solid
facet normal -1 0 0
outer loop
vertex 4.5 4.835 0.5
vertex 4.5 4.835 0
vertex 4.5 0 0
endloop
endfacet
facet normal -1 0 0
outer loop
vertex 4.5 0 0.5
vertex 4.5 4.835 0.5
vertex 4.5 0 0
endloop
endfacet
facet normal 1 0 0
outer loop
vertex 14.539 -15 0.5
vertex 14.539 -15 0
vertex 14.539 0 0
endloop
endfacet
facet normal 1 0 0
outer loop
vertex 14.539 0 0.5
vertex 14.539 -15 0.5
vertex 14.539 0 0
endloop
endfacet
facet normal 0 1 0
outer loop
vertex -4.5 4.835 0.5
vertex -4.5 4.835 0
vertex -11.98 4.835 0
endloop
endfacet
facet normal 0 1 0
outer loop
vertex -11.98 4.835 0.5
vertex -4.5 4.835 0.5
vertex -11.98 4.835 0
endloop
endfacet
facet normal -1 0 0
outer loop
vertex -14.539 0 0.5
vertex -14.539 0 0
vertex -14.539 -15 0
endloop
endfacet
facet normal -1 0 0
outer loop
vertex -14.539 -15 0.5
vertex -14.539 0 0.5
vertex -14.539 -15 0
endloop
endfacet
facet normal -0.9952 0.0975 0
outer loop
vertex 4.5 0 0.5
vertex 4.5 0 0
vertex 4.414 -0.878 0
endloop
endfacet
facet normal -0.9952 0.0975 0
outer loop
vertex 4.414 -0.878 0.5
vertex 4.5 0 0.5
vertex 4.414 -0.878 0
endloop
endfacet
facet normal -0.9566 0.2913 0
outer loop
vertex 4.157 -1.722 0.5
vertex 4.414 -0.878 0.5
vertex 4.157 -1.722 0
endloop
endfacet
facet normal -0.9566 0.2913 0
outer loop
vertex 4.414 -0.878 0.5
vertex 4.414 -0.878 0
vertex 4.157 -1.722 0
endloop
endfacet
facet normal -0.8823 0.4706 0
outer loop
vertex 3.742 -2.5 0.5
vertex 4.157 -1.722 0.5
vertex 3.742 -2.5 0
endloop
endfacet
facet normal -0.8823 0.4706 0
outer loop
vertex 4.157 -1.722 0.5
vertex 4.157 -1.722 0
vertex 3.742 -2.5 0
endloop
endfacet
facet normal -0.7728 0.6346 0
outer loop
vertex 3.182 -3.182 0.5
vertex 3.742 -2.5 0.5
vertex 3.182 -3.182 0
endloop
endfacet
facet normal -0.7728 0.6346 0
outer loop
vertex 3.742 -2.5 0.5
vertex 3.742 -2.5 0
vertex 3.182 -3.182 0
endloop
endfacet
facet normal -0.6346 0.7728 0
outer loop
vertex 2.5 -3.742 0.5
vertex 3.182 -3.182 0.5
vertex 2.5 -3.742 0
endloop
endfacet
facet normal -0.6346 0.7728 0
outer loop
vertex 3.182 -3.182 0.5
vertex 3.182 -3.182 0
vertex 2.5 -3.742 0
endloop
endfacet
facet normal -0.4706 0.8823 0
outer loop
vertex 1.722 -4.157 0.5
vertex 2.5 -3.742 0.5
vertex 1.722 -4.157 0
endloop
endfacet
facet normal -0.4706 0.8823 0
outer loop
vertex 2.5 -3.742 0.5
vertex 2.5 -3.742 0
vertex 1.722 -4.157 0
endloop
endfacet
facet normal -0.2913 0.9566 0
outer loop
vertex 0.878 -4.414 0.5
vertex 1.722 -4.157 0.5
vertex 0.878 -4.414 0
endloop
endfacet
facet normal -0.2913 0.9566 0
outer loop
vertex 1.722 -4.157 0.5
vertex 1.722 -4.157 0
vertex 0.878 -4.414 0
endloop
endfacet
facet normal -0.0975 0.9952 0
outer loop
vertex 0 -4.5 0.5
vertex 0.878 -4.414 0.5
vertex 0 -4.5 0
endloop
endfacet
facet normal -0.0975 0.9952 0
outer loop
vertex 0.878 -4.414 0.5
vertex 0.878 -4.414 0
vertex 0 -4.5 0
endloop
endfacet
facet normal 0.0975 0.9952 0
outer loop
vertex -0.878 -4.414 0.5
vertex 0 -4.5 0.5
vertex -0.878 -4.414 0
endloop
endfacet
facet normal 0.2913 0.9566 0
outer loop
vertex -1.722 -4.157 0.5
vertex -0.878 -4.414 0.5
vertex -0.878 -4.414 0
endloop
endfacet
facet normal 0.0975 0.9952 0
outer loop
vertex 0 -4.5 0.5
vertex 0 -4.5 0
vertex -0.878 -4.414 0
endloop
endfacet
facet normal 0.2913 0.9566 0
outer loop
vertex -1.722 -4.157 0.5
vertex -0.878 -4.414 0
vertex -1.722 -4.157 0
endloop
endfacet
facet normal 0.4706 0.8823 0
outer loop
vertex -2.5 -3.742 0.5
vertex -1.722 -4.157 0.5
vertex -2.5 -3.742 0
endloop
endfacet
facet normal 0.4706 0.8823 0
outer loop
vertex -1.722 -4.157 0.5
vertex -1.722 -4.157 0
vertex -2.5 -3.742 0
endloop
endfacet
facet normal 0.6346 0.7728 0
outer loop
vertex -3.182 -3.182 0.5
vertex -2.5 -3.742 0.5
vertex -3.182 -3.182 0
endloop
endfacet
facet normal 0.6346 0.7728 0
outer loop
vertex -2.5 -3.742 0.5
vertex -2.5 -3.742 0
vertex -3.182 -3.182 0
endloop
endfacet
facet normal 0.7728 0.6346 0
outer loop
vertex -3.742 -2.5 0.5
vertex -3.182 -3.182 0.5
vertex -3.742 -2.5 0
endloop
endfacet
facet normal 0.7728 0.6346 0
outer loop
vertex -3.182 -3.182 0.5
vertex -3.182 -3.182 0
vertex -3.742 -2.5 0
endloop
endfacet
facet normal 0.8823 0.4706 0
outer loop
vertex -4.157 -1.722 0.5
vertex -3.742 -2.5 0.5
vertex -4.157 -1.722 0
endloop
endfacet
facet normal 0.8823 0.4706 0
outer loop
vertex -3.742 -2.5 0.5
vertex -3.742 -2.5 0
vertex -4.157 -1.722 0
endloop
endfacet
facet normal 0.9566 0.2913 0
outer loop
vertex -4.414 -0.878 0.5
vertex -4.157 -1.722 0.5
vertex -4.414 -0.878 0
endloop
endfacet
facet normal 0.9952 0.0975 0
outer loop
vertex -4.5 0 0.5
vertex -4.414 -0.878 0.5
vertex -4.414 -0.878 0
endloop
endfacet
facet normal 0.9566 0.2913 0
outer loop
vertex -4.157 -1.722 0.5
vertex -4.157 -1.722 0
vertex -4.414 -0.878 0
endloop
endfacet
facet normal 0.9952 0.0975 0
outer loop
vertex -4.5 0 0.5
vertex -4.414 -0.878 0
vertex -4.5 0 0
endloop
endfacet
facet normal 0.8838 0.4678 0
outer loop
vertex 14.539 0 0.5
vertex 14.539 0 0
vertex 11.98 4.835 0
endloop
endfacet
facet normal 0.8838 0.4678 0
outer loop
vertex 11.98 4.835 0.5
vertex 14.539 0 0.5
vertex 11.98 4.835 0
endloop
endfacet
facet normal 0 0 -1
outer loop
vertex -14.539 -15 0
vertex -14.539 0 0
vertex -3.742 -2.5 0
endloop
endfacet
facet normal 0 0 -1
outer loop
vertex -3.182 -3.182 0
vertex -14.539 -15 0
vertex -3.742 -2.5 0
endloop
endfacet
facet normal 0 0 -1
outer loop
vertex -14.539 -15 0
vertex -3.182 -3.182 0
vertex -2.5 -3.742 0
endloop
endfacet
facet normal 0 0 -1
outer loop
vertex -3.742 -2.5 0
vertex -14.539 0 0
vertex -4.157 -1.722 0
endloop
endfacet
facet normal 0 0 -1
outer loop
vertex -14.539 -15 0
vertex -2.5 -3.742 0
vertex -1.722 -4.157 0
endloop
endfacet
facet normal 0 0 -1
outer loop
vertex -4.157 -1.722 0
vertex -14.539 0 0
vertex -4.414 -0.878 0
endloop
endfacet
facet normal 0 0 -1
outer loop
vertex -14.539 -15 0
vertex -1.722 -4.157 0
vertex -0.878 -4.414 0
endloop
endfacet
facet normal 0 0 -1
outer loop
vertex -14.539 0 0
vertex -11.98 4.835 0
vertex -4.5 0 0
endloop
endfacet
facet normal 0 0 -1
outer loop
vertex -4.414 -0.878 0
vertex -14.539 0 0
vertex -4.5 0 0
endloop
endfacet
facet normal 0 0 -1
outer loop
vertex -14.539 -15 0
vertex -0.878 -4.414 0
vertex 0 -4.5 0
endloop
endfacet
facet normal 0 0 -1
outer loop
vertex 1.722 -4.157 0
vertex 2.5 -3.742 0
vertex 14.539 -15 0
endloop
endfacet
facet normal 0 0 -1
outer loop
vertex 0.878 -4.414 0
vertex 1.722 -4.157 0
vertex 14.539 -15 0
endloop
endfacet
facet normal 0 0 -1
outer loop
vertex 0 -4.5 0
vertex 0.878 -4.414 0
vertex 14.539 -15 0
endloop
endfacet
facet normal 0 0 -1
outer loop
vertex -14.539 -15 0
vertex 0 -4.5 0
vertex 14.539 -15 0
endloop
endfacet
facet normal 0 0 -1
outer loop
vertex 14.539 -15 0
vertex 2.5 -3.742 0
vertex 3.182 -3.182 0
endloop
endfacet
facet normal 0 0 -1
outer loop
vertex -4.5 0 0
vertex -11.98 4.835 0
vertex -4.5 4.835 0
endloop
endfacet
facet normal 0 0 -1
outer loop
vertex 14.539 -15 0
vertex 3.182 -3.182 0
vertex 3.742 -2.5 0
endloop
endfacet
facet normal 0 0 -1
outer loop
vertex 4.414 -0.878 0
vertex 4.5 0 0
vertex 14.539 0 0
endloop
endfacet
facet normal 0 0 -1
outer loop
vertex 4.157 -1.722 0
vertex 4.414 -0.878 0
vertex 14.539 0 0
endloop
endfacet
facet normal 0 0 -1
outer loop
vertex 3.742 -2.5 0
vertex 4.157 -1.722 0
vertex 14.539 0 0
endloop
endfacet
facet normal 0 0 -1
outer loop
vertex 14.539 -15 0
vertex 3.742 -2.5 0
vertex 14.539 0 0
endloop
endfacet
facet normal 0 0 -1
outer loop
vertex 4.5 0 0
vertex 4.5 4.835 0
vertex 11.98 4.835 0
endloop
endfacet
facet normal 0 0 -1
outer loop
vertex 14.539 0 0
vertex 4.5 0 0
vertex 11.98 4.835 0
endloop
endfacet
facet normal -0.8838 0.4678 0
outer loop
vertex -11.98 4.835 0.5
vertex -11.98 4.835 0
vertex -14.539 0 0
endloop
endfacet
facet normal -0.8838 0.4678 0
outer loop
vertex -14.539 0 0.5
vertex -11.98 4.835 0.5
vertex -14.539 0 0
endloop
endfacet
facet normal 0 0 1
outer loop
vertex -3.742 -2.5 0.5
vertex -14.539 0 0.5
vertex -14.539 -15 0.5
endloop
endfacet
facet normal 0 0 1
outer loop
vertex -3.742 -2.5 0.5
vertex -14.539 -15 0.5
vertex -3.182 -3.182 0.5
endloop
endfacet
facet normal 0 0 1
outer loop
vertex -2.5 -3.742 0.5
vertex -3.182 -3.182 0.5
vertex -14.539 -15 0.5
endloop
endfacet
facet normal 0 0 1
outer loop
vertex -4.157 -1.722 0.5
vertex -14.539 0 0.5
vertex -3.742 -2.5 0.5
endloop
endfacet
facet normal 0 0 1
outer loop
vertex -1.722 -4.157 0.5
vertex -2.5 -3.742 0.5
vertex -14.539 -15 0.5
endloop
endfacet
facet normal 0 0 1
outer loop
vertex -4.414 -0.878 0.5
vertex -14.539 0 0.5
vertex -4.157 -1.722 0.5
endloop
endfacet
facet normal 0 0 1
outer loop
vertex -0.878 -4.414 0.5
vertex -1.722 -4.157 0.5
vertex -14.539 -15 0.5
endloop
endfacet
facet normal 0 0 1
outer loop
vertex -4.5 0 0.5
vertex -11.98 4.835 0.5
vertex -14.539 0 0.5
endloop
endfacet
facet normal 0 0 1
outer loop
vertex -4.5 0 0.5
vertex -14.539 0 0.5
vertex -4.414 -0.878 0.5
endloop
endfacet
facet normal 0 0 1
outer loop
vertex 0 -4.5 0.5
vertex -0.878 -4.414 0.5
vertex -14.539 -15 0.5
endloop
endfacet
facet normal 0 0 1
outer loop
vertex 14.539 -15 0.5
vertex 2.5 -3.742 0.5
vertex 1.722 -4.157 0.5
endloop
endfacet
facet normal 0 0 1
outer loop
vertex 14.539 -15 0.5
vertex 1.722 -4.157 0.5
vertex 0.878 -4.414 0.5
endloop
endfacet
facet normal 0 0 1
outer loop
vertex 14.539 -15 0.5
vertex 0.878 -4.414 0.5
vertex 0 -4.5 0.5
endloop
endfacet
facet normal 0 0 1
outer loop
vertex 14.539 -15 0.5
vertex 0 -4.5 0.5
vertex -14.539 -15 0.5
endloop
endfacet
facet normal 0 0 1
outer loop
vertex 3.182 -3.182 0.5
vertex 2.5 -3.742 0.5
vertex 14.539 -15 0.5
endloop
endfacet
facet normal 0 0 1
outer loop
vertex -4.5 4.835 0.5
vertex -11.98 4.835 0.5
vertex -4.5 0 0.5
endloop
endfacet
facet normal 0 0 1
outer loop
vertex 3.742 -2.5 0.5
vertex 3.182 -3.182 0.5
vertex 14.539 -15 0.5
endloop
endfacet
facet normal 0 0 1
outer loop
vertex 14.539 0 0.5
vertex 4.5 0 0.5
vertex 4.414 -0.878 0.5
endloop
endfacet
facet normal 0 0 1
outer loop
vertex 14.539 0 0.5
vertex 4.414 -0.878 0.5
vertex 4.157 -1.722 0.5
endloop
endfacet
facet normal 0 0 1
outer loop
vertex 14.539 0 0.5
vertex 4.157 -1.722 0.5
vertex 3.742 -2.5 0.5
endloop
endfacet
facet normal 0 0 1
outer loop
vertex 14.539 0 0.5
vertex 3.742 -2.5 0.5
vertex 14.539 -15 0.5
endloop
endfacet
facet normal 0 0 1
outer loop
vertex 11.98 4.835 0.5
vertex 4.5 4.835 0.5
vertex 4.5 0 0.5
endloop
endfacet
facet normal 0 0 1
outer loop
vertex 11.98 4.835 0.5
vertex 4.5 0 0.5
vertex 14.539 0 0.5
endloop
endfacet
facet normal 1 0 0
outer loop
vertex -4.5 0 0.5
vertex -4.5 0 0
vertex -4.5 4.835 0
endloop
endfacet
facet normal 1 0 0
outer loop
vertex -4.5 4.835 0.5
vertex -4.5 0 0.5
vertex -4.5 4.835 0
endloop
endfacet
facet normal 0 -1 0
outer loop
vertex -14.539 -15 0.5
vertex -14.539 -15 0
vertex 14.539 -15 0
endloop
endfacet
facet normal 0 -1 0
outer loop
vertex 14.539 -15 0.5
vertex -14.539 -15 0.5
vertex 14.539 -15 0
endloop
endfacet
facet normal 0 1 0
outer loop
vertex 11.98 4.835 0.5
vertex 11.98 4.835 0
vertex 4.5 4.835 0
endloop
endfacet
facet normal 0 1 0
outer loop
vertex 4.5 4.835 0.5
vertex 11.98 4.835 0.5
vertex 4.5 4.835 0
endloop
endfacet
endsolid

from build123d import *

# Parameters (mm, degrees)
F1_DEPTH = 0.5


with BuildPart() as f1:
    # F0 (on Top) → F1 (new body)
    with BuildSketch(Plane.XY):
        with BuildLine():
            ThreePointArc((4.5, 0), (0, -4.5), (-4.5, 0))
            Line((-4.5, 0), (-4.5, 4.834927))
            Line((-4.5, 4.834927), (-11.980261, 4.834927))
            Line((-11.980261, 4.834927), (-14.539381, 0))
            Line((-14.539381, 0), (-14.539381, -15))
            Line((-14.539381, -15), (0, -15))
            Line((0, -15), (14.539381, -15))
            Line((14.539381, -15), (14.539381, 0))
            Line((14.539381, 0), (11.980261, 4.834927))
            Line((11.980261, 4.834927), (4.5, 4.834927))
            Line((4.5, 4.834927), (4.5, 0))
        make_face()
    extrude(amount=F1_DEPTH)


solid = f1.part
